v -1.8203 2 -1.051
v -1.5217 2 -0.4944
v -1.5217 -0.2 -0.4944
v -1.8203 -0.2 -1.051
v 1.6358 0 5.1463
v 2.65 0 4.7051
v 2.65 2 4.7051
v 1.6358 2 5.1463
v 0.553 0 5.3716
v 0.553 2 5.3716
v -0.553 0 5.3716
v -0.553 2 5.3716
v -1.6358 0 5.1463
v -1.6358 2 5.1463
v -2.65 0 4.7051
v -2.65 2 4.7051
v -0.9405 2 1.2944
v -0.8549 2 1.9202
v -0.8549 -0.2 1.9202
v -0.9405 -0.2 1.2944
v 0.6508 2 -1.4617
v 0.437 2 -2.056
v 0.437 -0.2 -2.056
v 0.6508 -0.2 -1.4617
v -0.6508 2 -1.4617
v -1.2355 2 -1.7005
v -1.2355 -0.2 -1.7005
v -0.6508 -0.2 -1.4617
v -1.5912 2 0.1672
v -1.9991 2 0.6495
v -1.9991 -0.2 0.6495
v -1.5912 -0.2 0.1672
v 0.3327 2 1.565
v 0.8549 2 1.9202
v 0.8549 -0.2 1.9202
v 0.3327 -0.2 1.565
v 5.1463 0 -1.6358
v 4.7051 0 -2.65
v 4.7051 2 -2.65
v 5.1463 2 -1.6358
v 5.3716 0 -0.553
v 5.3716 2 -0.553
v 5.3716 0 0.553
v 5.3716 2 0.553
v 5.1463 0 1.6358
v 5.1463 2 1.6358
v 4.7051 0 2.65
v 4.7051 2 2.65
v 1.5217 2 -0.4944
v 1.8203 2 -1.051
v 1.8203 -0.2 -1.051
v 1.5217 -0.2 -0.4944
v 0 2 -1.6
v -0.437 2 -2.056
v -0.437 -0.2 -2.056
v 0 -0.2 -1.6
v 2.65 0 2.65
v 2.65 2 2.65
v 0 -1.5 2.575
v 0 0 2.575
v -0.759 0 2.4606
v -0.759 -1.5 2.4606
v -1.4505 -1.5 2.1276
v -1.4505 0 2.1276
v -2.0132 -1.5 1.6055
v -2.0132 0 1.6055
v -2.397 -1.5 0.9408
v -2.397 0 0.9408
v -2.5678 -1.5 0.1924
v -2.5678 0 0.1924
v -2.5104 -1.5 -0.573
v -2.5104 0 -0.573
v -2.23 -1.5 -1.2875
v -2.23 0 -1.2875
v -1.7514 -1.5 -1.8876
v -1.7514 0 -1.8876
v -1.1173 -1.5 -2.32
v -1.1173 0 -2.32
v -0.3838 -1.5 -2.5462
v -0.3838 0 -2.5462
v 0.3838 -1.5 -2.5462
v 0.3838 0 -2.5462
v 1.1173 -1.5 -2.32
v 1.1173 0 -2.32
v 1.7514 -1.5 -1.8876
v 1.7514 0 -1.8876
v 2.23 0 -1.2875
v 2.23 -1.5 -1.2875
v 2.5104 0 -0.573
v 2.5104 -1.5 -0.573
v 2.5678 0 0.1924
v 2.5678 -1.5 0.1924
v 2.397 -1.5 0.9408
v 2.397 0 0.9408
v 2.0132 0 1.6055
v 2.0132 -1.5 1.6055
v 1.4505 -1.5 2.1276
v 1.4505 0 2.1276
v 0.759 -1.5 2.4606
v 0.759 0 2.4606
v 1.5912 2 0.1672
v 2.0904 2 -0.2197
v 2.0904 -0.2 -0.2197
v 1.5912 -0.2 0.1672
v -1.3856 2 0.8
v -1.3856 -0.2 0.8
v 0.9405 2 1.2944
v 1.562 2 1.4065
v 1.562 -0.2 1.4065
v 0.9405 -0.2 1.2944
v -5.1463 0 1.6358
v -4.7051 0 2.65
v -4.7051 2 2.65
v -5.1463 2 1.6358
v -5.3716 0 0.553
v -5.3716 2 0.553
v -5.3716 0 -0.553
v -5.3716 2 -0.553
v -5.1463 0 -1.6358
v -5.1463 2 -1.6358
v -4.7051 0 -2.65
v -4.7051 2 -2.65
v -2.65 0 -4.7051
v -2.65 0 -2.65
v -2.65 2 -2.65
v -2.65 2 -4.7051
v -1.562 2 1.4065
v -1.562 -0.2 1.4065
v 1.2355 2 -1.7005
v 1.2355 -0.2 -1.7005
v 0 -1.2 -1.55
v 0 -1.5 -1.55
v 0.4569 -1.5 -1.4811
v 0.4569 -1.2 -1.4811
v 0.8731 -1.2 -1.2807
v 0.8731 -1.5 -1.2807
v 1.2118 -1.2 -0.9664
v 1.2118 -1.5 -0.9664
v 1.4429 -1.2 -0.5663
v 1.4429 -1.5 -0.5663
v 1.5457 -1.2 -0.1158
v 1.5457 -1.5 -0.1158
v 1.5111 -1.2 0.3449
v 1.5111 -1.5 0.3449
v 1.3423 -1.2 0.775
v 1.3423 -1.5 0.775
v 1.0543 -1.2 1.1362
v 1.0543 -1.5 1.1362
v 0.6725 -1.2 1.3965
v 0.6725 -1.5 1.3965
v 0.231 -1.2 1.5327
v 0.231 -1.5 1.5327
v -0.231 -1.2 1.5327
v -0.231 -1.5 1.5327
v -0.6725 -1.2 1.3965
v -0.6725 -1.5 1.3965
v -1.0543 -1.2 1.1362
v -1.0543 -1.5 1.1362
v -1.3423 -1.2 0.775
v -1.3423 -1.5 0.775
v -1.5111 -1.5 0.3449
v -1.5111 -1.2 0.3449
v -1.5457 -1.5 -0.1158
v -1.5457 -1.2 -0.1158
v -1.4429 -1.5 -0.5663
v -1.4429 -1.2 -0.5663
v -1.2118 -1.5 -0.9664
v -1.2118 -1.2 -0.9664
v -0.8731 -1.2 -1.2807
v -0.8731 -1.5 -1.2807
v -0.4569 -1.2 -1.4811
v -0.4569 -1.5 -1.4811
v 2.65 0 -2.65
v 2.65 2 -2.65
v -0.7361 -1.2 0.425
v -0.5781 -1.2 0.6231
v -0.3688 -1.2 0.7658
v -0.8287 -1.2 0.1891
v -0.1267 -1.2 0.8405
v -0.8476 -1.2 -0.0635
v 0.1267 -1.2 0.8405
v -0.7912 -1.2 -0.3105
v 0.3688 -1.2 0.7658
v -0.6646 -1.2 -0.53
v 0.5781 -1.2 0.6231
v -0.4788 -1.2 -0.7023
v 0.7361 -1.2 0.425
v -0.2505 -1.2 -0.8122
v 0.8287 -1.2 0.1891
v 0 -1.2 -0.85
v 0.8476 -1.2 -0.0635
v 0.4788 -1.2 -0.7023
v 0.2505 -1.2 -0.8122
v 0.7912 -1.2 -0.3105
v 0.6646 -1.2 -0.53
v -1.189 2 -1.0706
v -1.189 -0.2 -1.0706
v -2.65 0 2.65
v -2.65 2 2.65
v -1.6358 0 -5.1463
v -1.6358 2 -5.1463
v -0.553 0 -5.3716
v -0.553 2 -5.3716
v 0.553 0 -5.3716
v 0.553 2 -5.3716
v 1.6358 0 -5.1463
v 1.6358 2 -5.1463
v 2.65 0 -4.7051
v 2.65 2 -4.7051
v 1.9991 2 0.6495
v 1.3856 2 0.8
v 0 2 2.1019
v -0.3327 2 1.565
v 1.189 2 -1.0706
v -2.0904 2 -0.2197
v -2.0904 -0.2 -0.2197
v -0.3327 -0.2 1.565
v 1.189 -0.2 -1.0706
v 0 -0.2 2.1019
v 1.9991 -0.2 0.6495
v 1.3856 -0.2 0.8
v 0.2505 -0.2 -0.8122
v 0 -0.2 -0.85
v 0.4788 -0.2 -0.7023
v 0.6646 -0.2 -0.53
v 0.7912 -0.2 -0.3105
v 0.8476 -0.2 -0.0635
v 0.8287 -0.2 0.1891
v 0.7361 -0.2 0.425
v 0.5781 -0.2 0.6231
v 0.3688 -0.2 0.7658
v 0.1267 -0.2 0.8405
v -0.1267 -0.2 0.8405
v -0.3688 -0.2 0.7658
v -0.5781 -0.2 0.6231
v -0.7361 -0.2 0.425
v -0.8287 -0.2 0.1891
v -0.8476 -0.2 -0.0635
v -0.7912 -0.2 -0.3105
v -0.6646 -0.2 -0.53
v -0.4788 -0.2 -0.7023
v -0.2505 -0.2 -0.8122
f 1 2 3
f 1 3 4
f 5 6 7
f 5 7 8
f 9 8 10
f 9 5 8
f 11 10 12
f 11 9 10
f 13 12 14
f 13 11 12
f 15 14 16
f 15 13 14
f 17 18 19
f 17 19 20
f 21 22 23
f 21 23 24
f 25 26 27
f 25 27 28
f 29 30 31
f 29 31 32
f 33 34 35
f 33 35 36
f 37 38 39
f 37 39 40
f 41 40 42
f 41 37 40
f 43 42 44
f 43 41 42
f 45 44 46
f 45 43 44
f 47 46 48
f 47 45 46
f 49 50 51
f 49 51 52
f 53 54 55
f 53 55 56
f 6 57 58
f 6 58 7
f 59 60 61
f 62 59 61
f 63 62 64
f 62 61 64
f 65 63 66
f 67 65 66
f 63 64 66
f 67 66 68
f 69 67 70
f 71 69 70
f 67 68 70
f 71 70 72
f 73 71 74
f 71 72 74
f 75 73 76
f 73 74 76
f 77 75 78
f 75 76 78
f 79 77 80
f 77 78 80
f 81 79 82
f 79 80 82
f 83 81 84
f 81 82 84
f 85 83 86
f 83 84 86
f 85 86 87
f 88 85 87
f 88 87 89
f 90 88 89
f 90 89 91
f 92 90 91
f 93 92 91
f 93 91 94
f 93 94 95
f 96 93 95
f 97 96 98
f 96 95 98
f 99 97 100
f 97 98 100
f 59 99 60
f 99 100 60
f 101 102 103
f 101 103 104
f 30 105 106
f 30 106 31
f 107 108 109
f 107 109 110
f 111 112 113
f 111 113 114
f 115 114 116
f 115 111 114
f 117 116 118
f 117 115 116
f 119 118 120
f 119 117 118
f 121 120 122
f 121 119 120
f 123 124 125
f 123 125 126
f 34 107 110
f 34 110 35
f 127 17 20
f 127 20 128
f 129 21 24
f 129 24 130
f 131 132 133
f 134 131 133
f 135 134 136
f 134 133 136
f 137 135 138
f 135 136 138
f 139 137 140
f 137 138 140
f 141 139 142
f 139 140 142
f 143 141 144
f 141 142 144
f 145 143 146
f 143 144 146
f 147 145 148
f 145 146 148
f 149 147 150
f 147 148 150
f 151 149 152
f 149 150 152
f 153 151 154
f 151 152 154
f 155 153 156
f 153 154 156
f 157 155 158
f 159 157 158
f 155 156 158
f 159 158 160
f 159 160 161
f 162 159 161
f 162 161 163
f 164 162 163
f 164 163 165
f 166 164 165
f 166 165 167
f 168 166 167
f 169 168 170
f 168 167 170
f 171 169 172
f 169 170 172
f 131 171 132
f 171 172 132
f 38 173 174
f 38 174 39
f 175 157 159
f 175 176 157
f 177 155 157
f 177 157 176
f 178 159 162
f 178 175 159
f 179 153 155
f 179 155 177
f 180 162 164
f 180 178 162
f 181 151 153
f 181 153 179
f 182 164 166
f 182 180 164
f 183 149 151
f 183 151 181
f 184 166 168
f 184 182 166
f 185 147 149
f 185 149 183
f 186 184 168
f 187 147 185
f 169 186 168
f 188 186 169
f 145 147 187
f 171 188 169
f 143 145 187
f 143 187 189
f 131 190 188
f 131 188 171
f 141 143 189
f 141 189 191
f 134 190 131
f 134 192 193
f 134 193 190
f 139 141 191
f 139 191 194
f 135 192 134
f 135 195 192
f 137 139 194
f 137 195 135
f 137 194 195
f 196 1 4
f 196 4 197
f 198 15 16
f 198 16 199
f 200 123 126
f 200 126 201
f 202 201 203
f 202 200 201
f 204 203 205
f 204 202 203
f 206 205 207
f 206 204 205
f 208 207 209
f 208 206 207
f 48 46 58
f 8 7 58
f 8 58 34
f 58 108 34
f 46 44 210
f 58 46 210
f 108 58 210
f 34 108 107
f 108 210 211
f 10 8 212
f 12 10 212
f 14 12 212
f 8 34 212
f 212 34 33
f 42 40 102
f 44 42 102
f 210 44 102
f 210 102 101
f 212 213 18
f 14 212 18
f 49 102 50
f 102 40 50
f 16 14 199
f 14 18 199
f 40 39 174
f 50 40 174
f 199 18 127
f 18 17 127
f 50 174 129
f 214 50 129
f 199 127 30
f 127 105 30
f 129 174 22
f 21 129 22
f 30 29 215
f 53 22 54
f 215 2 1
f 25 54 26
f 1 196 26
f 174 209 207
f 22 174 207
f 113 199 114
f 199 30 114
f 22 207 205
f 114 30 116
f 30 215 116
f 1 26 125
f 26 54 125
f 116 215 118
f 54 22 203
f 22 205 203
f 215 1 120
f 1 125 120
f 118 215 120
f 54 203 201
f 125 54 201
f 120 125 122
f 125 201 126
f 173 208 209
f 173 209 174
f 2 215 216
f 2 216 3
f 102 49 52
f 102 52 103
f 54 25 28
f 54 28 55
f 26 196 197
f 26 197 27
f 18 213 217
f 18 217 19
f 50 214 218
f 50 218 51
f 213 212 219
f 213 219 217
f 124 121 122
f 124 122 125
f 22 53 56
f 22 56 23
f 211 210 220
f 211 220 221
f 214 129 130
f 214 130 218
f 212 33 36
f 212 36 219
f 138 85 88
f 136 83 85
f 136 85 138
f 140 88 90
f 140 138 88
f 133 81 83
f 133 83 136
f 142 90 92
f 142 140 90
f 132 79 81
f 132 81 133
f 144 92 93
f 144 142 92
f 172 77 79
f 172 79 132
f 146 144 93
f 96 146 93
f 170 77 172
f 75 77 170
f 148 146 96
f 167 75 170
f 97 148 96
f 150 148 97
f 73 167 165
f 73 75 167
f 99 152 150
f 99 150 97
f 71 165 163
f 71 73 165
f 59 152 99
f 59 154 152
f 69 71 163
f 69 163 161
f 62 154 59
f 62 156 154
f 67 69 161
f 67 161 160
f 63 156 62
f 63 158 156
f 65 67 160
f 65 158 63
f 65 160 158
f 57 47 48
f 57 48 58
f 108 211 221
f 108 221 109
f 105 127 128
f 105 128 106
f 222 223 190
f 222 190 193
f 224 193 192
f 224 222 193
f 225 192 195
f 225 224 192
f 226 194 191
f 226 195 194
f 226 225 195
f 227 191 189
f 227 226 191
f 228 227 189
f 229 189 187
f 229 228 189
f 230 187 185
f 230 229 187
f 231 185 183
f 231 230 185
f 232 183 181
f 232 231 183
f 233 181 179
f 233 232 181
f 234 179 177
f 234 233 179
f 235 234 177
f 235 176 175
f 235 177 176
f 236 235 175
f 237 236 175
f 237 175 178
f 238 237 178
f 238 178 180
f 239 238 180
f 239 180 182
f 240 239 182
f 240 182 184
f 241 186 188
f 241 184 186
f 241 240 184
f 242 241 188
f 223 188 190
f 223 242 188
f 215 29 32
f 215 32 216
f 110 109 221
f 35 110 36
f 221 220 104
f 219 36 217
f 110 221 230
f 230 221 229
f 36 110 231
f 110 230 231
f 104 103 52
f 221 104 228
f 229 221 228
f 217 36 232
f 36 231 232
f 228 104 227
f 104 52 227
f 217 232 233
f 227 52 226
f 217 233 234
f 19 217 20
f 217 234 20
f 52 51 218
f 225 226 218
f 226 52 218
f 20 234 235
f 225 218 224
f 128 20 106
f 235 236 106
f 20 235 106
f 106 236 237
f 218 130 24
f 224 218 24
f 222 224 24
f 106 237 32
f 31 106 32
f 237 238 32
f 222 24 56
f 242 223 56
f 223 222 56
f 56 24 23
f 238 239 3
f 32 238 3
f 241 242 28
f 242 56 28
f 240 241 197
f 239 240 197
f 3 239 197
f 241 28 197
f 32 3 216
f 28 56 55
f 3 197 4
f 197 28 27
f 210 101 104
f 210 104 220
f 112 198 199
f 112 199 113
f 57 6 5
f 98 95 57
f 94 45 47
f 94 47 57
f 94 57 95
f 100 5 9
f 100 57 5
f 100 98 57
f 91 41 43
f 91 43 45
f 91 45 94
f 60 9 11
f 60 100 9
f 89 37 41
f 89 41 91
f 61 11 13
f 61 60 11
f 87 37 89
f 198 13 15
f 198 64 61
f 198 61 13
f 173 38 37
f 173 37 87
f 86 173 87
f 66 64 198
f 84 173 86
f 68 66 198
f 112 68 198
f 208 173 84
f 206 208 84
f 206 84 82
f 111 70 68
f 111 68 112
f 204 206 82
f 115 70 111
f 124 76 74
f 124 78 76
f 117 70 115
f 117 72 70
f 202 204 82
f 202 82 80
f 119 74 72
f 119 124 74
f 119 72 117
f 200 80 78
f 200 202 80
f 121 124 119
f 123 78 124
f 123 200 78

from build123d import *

# Parameters (mm, degrees)
EXTRUDE_1_DEPTH     = 2
SKETCH_2_R          = 2.575
SKETCH_2_R_2        = 0.85
EXTRUDE_2_DEPTH     = 1.5
SKETCH_3_R          = 1.55
CUT_EXTRUDE_1_DEPTH = 0.3
CUT_EXTRUDE_2_DEPTH = 2.2


with BuildPart() as part:
    # ｽｹｯﾁ1 → ﾎﾞｽ - 押し出し1 (new body)
    with BuildSketch(Plane(origin=(0, 0, 0), x_dir=(1, 0, 0), z_dir=(0, 1, 0))):
        with BuildLine():
            Line((2.65, 4.705050478), (2.65, 2.65))
            Line((2.65, 2.65), (4.705050478, 2.65))
            ThreePointArc((4.705050478, 2.65), (5.4, 0), (4.705050478, -2.65))
            Line((4.705050478, -2.65), (2.65, -2.65))
            Line((2.65, -2.65), (2.65, -4.705050478))
            ThreePointArc((2.65, -4.705050478), (0, -5.4), (-2.65, -4.705050478))
            Line((-2.65, -4.705050478), (-2.65, -2.65))
            Line((-2.65, -2.65), (-4.705050478, -2.65))
            ThreePointArc((-4.705050478, -2.65), (-5.4, 0), (-4.705050478, 2.65))
            Line((-4.705050478, 2.65), (-2.65, 2.65))
            Line((-2.65, 2.65), (-2.65, 4.705050478))
            ThreePointArc((-2.65, 4.705050478), (0, 5.4), (2.65, 4.705050478))
        make_face()
    extrude(amount=EXTRUDE_1_DEPTH)

    # ｽｹｯﾁ2 → ﾎﾞｽ - 押し出し2 (add)
    with BuildSketch(Plane.XZ):
        with Locations(Location((0, 0, 0), (0, 0, 90))):
            Circle(SKETCH_2_R)
        with Locations(Location((0, 0, 0), (0, 0, 270))):
            Circle(SKETCH_2_R_2, mode=Mode.SUBTRACT)
    extrude(amount=EXTRUDE_2_DEPTH)

    # ｽｹｯﾁ3 → ｶｯﾄ - 押し出し1 (cut)
    with BuildSketch(Plane.XZ.offset(1.5)):
        with Locations(Location((0, 0, 0), (0, 0, 270))):
            Circle(SKETCH_3_R)
    extrude(amount=-CUT_EXTRUDE_1_DEPTH, mode=Mode.SUBTRACT)

    # ｽｹｯﾁ4 → ｶｯﾄ - 押し出し2 (cut)
    with BuildSketch(Plane(origin=(0, 2, 0), x_dir=(1, 0, 0), z_dir=(0, 1, 0))):
        Polygon((0, 1.6), (0.437016815, 2.056002469), (0.650778629, 1.461672732), (1.235486269, 1.700500964), (1.189031721, 1.07060897), (1.820328922, 1.050967393), (1.521690426, 0.494427191), (2.090420168, 0.219712013), (1.591235033, -0.167245541), (1.999058776, -0.64953357), (1.385640646, -0.8), (1.56204196, -1.406468898), (0.940456404, -1.294427191), (0.854933899, -1.920212977), (0.332658705, -1.565036161), (0, -2.101934787), (-0.332658705, -1.565036161), (-0.854933899, -1.920212977), (-0.940456404, -1.294427191), (-1.56204196, -1.406468898), (-1.385640646, -0.8), (-1.999058776, -0.64953357), (-1.591235033, -0.167245541), (-2.090420168, 0.219712013), (-1.521690426, 0.494427191), (-1.820328922, 1.050967393), (-1.189031721, 1.07060897), (-1.235486269, 1.700500964), (-0.650778629, 1.461672732), (-0.437016815, 2.056002469), align=None)
    extrude(amount=-CUT_EXTRUDE_2_DEPTH, mode=Mode.SUBTRACT)


solid = part.part
